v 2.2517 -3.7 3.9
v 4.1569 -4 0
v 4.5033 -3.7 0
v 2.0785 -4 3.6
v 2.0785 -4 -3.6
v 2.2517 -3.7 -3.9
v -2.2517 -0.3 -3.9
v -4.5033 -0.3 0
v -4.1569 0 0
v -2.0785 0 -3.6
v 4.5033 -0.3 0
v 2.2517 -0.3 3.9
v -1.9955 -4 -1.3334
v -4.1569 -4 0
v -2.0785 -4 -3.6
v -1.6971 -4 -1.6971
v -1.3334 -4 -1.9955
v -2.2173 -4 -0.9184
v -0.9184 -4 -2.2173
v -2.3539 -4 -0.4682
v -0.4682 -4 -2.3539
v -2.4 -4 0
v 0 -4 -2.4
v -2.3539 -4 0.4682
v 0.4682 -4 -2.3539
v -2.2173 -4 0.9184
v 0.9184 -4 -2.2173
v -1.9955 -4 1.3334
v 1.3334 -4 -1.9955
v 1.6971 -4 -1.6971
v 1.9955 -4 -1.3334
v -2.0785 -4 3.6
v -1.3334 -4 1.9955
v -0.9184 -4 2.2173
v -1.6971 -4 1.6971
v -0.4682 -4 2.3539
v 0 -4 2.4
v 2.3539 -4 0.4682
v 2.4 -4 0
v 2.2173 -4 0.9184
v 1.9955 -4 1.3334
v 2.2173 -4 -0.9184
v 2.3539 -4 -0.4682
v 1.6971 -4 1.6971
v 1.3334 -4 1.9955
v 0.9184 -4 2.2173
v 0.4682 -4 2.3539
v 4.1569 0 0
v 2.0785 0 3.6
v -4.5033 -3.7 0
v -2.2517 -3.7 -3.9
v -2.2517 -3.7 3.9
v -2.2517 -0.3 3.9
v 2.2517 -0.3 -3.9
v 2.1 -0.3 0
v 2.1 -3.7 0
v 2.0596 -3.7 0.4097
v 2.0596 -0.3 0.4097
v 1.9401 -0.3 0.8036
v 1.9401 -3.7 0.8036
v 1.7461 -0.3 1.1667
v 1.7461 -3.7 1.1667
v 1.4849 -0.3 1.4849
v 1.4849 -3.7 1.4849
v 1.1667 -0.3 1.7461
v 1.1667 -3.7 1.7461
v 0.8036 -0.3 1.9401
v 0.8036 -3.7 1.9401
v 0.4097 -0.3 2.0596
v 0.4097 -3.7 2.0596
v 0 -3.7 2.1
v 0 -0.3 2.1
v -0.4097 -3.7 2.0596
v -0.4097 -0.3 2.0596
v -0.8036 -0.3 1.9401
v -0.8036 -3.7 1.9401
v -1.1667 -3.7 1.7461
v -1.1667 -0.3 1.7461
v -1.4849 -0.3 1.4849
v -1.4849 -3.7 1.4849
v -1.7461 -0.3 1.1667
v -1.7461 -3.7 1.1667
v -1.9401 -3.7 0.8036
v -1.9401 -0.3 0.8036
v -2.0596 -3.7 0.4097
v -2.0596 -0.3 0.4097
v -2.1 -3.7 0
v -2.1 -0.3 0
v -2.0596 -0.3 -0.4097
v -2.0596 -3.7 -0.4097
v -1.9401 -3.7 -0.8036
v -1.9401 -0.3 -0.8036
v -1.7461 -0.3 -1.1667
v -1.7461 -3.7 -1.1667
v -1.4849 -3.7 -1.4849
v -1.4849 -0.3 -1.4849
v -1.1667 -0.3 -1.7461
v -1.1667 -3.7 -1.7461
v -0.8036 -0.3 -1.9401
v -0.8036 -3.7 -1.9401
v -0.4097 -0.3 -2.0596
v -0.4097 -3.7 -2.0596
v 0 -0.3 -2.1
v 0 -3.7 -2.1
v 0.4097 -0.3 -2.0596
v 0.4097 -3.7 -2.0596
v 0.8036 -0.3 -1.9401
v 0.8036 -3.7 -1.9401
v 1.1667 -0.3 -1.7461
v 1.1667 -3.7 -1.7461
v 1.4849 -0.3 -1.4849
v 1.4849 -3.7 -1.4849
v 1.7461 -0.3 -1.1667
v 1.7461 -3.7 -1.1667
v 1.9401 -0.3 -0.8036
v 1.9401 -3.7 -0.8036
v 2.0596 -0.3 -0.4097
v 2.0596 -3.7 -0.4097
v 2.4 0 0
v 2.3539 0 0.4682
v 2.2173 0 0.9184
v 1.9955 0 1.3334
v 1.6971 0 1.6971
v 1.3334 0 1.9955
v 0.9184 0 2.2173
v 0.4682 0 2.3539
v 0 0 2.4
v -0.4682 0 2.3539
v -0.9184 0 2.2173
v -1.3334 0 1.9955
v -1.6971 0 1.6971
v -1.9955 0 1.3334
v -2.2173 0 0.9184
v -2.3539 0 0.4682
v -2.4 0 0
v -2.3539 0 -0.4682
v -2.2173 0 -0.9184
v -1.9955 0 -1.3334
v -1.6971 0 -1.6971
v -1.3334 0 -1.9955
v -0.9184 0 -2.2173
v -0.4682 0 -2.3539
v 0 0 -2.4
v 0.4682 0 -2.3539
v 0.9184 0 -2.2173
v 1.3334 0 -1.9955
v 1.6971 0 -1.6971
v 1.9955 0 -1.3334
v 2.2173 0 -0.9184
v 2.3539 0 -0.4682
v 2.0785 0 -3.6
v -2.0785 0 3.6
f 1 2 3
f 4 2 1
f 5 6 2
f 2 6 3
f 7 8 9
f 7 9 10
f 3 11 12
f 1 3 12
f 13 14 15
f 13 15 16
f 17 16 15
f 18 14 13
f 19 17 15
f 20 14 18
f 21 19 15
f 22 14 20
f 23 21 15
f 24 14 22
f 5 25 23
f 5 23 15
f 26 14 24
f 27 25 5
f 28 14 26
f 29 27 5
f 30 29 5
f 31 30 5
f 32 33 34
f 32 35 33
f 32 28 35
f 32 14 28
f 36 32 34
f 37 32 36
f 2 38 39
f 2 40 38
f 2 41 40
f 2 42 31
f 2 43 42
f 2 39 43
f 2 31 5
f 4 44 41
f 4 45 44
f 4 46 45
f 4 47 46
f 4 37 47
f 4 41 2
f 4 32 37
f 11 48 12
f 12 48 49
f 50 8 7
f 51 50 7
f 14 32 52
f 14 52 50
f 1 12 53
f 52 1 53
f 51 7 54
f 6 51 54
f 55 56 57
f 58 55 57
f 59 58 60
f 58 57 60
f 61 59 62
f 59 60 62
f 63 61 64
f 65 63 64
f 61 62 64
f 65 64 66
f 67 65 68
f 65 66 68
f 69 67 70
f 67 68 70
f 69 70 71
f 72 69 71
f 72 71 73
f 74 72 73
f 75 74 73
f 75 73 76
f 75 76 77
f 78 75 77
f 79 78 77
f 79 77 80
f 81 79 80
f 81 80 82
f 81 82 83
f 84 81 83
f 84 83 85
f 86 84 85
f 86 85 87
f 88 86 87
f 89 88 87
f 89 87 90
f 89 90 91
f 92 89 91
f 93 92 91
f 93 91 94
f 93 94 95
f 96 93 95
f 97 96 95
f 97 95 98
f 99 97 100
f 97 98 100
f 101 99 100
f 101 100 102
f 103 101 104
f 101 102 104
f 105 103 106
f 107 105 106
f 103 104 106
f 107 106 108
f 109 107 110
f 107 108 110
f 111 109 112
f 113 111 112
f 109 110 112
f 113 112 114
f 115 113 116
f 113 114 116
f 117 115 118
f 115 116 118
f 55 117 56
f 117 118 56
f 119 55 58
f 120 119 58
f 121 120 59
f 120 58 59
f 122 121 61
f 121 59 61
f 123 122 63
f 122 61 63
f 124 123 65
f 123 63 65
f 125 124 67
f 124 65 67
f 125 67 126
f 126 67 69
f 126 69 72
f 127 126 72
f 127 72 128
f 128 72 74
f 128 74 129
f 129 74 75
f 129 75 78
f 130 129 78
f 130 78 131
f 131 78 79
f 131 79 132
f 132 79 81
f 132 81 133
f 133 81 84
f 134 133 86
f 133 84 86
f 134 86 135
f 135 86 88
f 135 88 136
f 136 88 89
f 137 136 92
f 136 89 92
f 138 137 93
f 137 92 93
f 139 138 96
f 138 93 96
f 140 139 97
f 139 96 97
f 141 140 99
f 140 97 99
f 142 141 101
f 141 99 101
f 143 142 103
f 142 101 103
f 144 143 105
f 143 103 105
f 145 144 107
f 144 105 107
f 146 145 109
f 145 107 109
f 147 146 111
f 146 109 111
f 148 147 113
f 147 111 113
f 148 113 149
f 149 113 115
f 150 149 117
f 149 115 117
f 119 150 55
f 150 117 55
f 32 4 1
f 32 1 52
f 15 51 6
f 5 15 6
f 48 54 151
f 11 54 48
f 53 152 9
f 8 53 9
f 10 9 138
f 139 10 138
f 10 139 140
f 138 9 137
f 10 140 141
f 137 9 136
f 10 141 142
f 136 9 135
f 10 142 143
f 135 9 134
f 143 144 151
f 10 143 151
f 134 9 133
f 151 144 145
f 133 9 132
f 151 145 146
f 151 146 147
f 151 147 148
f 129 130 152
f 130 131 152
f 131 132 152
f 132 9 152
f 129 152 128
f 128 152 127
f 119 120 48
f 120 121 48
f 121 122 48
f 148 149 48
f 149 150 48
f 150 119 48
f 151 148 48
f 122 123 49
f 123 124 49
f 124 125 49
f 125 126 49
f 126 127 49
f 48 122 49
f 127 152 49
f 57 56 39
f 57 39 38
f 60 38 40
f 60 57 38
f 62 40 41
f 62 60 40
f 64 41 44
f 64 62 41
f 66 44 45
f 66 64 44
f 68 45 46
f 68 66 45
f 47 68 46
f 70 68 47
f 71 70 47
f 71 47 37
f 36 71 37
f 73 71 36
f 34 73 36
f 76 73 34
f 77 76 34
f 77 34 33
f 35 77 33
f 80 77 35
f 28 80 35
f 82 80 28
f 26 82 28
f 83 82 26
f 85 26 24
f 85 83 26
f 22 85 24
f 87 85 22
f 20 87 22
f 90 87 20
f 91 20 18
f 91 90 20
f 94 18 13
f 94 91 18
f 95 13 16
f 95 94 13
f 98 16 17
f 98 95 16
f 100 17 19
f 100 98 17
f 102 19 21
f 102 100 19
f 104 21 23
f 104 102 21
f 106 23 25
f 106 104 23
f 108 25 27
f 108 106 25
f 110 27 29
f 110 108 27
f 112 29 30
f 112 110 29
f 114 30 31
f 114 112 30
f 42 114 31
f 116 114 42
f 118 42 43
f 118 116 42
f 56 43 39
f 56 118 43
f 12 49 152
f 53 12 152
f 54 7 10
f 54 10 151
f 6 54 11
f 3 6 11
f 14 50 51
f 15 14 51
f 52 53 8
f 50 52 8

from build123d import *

# Parameters (mm, degrees)
F1_DEPTH = 4
F3_D     = 4.2
F4_SIZE  = 0.3


with BuildPart() as f1:
    # F0 (on Front) → F1 (new body)
    with BuildSketch(Plane.XZ):
        Polygon((2.2516660498, 3.9), (-2.2516660498, 3.9), (-4.5033320997, 0), (-2.2516660498, -3.9), (2.2516660498, -3.9), (4.5033320997, 0), align=None)
    extrude(amount=F1_DEPTH)

    # F3 (through all)
    with Locations(Plane(origin=(0, 0, 0), x_dir=(-1, 0, 0), z_dir=(0, 1, 0))):
        with Locations((0, 0)):
            Hole(F3_D / 2)

    # F4
    f4_edges = [f1.edges().sort_by_distance(p)[0] for p in [
        (0, 0, -3.9),
        (-3.377499, 0, -1.95),
        (0, 0, 3.9),
        (-3.377499, 0, 1.95),
        (3.377499, 0, 1.95),
        (3.377499, 0, -1.95),
        (2.1, 0, 0),
        (3.377499, -4, 1.95),
        (3.377499, -4, -1.95),
        (0, -4, 3.9),
        (0, -4, -3.9),
        (-3.377499, -4, 1.95),
        (-3.377499, -4, -1.95),
        (2.1, -4, 0),
    ]]
    chamfer(f4_edges, length=F4_SIZE)


solid = f1.part
